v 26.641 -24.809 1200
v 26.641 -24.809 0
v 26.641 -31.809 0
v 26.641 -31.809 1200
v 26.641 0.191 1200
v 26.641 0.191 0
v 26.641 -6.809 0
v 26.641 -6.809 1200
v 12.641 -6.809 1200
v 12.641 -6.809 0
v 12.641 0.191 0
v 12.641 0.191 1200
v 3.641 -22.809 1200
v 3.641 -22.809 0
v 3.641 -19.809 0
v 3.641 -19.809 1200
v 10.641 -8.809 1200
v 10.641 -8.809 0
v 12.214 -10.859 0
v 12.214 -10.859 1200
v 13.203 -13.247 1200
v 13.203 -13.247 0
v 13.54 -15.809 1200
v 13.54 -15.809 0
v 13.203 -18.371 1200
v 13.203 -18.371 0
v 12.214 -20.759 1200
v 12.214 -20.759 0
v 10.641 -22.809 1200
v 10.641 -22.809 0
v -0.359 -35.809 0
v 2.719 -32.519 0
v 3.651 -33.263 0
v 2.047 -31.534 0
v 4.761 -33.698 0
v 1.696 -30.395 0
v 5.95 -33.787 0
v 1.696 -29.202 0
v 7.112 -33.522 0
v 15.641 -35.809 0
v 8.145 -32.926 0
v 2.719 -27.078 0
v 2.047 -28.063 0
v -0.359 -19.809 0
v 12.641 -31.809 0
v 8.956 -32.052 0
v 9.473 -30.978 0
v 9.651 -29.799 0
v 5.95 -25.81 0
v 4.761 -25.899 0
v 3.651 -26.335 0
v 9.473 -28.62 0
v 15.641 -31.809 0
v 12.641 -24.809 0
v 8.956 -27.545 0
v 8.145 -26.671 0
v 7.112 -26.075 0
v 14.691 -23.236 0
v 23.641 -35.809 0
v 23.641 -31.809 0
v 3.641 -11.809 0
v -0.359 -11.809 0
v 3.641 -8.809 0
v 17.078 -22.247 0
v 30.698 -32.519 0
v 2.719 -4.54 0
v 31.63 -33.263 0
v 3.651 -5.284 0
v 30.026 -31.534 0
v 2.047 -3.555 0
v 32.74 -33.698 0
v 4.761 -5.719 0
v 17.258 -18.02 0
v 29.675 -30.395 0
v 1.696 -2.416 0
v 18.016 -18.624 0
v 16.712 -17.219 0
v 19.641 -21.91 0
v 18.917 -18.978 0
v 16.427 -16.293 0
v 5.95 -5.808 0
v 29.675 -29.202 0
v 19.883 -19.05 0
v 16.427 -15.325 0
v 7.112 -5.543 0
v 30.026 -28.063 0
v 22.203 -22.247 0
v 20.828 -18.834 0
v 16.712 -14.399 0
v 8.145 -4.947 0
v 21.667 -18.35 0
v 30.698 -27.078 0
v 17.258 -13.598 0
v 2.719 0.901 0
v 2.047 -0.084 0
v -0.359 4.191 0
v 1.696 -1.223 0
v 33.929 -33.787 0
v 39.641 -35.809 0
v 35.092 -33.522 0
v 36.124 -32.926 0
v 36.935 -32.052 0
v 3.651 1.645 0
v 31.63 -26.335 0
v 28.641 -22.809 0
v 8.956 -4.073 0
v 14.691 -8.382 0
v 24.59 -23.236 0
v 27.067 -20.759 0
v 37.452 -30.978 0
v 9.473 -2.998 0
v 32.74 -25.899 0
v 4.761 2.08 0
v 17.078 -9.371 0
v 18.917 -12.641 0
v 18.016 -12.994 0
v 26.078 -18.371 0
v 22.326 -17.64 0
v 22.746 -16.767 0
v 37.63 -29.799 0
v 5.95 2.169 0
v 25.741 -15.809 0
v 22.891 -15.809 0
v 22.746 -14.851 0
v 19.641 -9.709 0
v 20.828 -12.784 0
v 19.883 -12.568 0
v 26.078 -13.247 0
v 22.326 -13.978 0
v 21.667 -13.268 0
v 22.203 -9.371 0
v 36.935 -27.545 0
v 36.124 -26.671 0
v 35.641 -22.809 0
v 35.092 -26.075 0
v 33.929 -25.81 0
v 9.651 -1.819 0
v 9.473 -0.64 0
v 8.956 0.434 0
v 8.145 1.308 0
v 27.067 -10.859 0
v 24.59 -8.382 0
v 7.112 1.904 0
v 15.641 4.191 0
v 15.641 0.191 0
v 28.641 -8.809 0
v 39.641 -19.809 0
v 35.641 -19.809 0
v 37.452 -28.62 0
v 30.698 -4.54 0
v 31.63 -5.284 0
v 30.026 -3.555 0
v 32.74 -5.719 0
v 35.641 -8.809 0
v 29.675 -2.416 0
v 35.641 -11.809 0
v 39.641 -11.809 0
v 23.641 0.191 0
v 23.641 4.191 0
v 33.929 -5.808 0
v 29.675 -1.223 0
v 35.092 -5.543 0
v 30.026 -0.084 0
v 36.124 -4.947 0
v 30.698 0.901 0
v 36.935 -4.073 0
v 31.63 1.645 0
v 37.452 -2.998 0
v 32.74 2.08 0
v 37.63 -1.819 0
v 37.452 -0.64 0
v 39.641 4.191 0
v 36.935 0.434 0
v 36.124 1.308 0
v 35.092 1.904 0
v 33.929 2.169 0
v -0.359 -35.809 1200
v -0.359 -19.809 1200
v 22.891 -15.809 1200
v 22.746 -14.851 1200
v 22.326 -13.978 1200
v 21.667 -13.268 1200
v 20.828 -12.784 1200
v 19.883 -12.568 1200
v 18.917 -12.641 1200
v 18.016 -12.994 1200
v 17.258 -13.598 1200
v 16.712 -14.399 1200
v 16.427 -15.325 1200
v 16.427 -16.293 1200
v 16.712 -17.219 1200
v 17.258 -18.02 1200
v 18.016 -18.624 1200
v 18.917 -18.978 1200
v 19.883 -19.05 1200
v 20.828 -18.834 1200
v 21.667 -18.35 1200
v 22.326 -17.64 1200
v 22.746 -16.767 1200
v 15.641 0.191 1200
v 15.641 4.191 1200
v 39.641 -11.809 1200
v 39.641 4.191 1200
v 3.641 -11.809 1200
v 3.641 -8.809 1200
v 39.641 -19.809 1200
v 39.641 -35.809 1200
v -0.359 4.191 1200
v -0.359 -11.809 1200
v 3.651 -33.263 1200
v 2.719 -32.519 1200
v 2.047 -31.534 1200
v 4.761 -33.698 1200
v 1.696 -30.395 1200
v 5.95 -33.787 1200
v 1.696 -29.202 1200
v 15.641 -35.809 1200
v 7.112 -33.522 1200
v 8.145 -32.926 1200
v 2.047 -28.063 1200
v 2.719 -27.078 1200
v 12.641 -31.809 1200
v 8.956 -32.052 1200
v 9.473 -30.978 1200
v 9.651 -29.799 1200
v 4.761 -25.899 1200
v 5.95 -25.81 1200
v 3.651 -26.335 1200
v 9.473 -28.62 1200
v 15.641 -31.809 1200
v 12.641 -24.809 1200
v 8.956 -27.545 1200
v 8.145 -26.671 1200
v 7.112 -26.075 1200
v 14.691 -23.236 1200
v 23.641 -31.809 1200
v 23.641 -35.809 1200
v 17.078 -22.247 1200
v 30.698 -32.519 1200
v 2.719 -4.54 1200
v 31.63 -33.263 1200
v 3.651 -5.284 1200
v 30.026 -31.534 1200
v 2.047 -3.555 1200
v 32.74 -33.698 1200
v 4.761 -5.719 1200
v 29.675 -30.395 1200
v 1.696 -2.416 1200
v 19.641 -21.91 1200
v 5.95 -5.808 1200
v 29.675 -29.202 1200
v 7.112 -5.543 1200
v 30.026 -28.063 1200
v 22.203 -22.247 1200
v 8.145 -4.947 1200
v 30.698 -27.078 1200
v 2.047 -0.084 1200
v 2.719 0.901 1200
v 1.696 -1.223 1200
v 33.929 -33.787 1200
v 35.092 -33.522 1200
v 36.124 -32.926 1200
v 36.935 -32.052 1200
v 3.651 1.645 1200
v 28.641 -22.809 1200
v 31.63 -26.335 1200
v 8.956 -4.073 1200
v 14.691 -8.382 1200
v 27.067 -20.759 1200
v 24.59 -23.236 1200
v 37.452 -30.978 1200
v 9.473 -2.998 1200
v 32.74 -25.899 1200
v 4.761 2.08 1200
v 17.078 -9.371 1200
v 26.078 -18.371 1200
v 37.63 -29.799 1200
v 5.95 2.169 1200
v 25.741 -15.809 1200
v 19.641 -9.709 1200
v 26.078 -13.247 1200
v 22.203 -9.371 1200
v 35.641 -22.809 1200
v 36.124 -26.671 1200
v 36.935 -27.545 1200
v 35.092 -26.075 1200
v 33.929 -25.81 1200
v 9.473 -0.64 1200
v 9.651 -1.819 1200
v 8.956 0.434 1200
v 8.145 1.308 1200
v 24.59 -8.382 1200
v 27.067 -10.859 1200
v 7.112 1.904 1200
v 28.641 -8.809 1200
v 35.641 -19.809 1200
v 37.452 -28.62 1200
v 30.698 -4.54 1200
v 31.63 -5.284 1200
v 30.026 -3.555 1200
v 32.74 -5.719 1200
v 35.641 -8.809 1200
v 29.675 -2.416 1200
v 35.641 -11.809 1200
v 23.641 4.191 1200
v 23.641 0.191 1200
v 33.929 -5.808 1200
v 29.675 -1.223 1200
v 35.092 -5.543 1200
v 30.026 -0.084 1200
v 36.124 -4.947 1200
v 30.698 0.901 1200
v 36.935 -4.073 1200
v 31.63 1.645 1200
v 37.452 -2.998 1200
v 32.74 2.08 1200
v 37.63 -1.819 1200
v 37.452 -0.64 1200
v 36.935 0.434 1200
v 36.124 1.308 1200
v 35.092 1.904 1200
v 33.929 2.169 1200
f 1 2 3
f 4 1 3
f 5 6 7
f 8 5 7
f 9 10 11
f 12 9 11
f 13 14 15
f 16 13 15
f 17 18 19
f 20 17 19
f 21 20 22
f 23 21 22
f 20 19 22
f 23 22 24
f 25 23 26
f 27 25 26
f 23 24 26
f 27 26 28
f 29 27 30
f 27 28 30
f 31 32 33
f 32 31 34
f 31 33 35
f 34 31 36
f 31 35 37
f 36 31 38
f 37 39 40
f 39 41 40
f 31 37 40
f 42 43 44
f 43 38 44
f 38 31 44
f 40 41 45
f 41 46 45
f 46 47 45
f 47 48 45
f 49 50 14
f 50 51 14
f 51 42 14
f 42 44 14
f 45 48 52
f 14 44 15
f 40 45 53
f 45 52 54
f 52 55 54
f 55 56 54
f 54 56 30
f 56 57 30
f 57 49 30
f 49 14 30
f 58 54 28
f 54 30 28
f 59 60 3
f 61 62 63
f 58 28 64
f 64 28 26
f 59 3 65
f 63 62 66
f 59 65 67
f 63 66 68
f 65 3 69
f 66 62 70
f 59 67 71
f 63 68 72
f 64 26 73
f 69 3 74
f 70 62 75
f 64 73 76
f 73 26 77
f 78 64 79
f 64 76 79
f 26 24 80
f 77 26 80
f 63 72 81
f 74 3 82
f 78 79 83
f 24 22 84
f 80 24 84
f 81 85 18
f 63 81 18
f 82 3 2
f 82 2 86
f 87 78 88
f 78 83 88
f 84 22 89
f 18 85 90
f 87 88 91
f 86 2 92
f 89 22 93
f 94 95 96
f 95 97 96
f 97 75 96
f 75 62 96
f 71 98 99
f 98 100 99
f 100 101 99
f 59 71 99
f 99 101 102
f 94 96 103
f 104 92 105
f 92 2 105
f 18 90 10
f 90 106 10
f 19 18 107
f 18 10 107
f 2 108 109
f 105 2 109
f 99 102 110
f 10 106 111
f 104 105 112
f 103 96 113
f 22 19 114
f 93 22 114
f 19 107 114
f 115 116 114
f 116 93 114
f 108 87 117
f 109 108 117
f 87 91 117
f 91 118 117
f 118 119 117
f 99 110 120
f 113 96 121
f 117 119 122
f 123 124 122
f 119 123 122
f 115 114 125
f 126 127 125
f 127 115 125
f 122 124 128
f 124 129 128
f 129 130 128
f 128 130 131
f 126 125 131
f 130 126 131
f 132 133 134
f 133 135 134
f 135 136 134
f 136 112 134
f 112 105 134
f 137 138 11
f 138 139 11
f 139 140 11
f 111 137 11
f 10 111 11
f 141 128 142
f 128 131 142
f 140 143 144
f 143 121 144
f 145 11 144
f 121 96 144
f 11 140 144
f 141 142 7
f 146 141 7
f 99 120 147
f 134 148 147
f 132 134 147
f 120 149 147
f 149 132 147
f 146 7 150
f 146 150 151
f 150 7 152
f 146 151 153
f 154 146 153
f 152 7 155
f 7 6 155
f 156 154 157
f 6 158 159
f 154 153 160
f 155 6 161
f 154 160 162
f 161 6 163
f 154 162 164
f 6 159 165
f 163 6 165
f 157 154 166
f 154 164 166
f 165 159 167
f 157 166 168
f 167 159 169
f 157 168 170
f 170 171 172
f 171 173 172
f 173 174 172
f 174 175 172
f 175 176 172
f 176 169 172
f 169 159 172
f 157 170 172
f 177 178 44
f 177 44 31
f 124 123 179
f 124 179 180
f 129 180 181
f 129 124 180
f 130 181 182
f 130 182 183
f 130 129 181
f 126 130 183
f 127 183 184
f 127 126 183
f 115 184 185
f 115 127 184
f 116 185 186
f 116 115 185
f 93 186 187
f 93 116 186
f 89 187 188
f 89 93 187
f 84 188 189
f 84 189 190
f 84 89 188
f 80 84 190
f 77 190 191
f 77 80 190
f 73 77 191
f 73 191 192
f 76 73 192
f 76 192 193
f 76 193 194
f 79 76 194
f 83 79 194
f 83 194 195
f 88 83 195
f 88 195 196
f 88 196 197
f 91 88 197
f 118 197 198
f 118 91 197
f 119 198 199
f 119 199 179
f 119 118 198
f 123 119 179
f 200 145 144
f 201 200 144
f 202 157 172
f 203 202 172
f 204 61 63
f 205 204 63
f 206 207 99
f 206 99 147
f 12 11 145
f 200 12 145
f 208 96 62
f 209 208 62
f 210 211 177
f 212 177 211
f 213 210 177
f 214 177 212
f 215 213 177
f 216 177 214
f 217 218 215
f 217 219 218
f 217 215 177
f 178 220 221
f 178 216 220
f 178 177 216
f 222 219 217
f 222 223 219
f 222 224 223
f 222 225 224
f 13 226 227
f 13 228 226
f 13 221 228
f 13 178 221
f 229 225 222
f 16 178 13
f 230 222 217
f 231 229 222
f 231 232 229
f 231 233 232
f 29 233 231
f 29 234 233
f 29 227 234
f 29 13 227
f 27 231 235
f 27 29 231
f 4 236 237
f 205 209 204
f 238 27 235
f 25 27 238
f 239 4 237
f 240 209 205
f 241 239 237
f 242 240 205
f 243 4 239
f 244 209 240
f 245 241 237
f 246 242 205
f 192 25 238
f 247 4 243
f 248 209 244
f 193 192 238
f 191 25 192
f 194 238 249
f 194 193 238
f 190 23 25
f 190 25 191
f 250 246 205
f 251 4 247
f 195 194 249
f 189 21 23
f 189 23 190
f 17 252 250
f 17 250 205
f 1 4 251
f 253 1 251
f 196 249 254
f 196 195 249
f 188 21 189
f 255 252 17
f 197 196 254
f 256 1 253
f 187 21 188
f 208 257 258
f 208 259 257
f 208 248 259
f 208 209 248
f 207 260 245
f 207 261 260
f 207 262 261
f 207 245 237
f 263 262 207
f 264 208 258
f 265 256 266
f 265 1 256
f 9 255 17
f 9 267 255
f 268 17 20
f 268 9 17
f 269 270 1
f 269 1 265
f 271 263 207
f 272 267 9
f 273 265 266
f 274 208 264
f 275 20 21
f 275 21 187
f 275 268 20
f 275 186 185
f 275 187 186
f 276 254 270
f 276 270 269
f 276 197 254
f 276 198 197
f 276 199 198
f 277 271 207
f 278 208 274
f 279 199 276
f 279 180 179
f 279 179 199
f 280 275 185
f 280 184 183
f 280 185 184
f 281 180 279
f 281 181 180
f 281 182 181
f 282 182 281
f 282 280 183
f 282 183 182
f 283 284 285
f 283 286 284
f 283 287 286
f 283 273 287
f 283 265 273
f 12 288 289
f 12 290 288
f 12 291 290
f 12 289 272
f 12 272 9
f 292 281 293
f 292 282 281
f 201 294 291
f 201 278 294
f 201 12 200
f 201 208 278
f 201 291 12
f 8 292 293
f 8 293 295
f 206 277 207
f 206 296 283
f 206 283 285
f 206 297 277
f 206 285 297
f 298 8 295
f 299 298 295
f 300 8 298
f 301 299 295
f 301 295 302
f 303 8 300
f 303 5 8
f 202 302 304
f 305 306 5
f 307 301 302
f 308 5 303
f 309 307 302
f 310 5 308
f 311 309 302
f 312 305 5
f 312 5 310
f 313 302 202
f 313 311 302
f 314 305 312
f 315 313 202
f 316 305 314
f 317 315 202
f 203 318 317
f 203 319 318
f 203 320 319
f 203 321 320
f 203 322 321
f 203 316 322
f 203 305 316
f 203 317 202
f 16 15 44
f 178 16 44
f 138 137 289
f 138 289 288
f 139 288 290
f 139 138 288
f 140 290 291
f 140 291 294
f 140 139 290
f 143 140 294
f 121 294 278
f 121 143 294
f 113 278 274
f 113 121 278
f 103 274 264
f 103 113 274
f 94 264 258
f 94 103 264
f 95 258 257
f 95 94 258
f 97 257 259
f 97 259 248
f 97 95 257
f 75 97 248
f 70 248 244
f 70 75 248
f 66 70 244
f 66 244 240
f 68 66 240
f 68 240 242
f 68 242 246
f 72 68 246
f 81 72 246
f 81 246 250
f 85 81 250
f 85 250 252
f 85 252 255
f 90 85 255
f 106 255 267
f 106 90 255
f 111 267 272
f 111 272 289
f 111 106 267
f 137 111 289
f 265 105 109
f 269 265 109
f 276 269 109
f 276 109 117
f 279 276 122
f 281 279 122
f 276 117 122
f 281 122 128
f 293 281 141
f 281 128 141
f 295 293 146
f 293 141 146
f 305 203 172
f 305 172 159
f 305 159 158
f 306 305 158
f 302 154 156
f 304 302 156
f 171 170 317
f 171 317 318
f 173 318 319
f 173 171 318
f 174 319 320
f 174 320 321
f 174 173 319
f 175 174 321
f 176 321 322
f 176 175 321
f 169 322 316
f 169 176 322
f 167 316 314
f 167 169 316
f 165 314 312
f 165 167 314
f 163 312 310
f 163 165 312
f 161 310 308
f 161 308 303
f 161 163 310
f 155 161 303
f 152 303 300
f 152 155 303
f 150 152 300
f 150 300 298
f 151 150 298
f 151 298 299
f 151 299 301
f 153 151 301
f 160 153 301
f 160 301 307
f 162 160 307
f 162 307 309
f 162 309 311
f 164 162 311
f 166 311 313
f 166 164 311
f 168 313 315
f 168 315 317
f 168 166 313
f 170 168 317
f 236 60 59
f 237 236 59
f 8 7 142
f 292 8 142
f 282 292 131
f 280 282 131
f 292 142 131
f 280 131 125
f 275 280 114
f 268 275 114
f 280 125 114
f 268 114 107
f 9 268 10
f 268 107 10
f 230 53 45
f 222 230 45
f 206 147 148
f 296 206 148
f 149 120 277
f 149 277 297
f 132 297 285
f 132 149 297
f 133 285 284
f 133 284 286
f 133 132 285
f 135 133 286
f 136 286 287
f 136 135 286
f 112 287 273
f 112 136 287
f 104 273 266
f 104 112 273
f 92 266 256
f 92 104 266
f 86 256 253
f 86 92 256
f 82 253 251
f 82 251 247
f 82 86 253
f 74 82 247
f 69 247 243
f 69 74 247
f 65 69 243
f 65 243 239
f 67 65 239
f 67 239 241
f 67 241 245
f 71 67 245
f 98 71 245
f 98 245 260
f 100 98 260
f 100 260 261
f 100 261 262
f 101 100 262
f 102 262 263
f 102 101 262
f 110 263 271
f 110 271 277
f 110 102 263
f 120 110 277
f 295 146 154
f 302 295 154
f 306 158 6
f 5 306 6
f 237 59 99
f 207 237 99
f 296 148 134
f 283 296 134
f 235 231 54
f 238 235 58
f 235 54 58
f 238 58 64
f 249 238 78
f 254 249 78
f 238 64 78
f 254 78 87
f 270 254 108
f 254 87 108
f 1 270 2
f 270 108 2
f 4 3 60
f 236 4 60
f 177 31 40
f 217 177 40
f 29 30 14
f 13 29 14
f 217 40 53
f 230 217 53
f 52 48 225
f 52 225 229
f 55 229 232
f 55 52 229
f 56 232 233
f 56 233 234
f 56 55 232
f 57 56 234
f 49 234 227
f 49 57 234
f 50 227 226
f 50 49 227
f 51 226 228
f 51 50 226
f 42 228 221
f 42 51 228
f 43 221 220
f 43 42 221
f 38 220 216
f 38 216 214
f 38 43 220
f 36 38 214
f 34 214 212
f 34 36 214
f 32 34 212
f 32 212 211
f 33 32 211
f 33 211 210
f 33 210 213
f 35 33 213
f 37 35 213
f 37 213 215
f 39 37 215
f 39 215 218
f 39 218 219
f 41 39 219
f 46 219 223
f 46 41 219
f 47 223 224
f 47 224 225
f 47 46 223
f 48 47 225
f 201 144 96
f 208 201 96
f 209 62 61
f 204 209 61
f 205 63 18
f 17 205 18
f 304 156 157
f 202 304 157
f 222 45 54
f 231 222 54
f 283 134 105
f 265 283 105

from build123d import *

# Parameters (mm, degrees)
F0_R     = 4
F0_R_2   = 3.25
F1_DEPTH = 1200


with BuildPart() as f1:
    # F0 (on Top) → F1 (new body)
    with BuildSketch(Plane.XY):
        with BuildLine():
            Line((15.640583, 4.190956), (-0.359417, 4.190956))
            Line((-0.359417, 4.190956), (-0.359417, -11.809044))
            Line((-0.359417, -11.809044), (3.640583, -11.809044))
            Line((3.640583, -11.809044), (3.640583, -8.809044))
            Line((3.640583, -8.809044), (10.640583, -8.809044))
            ThreePointArc((10.640583, -8.809044), (13.540078, -15.809044), (10.640583, -22.809044))
            Line((10.640583, -22.809044), (3.640583, -22.809044))
            Line((3.640583, -22.809044), (3.640583, -19.809044))
            Line((3.640583, -19.809044), (-0.359417, -19.809044))
            Line((-0.359417, -19.809044), (-0.359417, -35.809044))
            Line((-0.359417, -35.809044), (15.640583, -35.809044))
            Line((15.640583, -35.809044), (15.640583, -31.809044))
            Line((15.640583, -31.809044), (12.640583, -31.809044))
            Line((12.640583, -31.809044), (12.640583, -24.809044))
            ThreePointArc((12.640583, -24.809044), (19.640583, -21.909549), (26.640583, -24.809044))
            Line((26.640583, -24.809044), (26.640583, -31.809044))
            Line((26.640583, -31.809044), (23.640583, -31.809044))
            Line((23.640583, -31.809044), (23.640583, -35.809044))
            Line((23.640583, -35.809044), (39.640583, -35.809044))
            Line((39.640583, -35.809044), (39.640583, -19.809044))
            Line((39.640583, -19.809044), (35.640583, -19.809044))
            Line((35.640583, -19.809044), (35.640583, -22.809044))
            Line((35.640583, -22.809044), (28.640583, -22.809044))
            ThreePointArc((28.640583, -22.809044), (25.741088, -15.809044), (28.640583, -8.809044))
            Line((28.640583, -8.809044), (35.640583, -8.809044))
            Line((35.640583, -8.809044), (35.640583, -11.809044))
            Line((35.640583, -11.809044), (39.640583, -11.809044))
            Line((39.640583, -11.809044), (39.640583, 4.190956))
            Line((39.640583, 4.190956), (23.640583, 4.190956))
            Line((23.640583, 4.190956), (23.640583, 0.190956))
            Line((23.640583, 0.190956), (26.640583, 0.190956))
            Line((26.640583, 0.190956), (26.640583, -6.809044))
            ThreePointArc((26.640583, -6.809044), (19.640583, -9.708539), (12.640583, -6.809044))
            Line((12.640583, -6.809044), (12.640583, 0.190956))
            Line((12.640583, 0.190956), (15.640583, 0.190956))
            Line((15.640583, 0.190956), (15.640583, 4.190956))
        make_face()
        with Locations((5.650991, -29.798636)):
            Circle(F0_R, mode=Mode.SUBTRACT)
        with Locations((33.630175, -29.798636)):
            Circle(F0_R, mode=Mode.SUBTRACT)
        with Locations((5.650991, -1.819451)):
            Circle(F0_R, mode=Mode.SUBTRACT)
        with Locations((19.640583, -15.809044)):
            Circle(F0_R_2, mode=Mode.SUBTRACT)
        with Locations((33.630175, -1.819451)):
            Circle(F0_R, mode=Mode.SUBTRACT)
    extrude(amount=F1_DEPTH)


solid = f1.part
